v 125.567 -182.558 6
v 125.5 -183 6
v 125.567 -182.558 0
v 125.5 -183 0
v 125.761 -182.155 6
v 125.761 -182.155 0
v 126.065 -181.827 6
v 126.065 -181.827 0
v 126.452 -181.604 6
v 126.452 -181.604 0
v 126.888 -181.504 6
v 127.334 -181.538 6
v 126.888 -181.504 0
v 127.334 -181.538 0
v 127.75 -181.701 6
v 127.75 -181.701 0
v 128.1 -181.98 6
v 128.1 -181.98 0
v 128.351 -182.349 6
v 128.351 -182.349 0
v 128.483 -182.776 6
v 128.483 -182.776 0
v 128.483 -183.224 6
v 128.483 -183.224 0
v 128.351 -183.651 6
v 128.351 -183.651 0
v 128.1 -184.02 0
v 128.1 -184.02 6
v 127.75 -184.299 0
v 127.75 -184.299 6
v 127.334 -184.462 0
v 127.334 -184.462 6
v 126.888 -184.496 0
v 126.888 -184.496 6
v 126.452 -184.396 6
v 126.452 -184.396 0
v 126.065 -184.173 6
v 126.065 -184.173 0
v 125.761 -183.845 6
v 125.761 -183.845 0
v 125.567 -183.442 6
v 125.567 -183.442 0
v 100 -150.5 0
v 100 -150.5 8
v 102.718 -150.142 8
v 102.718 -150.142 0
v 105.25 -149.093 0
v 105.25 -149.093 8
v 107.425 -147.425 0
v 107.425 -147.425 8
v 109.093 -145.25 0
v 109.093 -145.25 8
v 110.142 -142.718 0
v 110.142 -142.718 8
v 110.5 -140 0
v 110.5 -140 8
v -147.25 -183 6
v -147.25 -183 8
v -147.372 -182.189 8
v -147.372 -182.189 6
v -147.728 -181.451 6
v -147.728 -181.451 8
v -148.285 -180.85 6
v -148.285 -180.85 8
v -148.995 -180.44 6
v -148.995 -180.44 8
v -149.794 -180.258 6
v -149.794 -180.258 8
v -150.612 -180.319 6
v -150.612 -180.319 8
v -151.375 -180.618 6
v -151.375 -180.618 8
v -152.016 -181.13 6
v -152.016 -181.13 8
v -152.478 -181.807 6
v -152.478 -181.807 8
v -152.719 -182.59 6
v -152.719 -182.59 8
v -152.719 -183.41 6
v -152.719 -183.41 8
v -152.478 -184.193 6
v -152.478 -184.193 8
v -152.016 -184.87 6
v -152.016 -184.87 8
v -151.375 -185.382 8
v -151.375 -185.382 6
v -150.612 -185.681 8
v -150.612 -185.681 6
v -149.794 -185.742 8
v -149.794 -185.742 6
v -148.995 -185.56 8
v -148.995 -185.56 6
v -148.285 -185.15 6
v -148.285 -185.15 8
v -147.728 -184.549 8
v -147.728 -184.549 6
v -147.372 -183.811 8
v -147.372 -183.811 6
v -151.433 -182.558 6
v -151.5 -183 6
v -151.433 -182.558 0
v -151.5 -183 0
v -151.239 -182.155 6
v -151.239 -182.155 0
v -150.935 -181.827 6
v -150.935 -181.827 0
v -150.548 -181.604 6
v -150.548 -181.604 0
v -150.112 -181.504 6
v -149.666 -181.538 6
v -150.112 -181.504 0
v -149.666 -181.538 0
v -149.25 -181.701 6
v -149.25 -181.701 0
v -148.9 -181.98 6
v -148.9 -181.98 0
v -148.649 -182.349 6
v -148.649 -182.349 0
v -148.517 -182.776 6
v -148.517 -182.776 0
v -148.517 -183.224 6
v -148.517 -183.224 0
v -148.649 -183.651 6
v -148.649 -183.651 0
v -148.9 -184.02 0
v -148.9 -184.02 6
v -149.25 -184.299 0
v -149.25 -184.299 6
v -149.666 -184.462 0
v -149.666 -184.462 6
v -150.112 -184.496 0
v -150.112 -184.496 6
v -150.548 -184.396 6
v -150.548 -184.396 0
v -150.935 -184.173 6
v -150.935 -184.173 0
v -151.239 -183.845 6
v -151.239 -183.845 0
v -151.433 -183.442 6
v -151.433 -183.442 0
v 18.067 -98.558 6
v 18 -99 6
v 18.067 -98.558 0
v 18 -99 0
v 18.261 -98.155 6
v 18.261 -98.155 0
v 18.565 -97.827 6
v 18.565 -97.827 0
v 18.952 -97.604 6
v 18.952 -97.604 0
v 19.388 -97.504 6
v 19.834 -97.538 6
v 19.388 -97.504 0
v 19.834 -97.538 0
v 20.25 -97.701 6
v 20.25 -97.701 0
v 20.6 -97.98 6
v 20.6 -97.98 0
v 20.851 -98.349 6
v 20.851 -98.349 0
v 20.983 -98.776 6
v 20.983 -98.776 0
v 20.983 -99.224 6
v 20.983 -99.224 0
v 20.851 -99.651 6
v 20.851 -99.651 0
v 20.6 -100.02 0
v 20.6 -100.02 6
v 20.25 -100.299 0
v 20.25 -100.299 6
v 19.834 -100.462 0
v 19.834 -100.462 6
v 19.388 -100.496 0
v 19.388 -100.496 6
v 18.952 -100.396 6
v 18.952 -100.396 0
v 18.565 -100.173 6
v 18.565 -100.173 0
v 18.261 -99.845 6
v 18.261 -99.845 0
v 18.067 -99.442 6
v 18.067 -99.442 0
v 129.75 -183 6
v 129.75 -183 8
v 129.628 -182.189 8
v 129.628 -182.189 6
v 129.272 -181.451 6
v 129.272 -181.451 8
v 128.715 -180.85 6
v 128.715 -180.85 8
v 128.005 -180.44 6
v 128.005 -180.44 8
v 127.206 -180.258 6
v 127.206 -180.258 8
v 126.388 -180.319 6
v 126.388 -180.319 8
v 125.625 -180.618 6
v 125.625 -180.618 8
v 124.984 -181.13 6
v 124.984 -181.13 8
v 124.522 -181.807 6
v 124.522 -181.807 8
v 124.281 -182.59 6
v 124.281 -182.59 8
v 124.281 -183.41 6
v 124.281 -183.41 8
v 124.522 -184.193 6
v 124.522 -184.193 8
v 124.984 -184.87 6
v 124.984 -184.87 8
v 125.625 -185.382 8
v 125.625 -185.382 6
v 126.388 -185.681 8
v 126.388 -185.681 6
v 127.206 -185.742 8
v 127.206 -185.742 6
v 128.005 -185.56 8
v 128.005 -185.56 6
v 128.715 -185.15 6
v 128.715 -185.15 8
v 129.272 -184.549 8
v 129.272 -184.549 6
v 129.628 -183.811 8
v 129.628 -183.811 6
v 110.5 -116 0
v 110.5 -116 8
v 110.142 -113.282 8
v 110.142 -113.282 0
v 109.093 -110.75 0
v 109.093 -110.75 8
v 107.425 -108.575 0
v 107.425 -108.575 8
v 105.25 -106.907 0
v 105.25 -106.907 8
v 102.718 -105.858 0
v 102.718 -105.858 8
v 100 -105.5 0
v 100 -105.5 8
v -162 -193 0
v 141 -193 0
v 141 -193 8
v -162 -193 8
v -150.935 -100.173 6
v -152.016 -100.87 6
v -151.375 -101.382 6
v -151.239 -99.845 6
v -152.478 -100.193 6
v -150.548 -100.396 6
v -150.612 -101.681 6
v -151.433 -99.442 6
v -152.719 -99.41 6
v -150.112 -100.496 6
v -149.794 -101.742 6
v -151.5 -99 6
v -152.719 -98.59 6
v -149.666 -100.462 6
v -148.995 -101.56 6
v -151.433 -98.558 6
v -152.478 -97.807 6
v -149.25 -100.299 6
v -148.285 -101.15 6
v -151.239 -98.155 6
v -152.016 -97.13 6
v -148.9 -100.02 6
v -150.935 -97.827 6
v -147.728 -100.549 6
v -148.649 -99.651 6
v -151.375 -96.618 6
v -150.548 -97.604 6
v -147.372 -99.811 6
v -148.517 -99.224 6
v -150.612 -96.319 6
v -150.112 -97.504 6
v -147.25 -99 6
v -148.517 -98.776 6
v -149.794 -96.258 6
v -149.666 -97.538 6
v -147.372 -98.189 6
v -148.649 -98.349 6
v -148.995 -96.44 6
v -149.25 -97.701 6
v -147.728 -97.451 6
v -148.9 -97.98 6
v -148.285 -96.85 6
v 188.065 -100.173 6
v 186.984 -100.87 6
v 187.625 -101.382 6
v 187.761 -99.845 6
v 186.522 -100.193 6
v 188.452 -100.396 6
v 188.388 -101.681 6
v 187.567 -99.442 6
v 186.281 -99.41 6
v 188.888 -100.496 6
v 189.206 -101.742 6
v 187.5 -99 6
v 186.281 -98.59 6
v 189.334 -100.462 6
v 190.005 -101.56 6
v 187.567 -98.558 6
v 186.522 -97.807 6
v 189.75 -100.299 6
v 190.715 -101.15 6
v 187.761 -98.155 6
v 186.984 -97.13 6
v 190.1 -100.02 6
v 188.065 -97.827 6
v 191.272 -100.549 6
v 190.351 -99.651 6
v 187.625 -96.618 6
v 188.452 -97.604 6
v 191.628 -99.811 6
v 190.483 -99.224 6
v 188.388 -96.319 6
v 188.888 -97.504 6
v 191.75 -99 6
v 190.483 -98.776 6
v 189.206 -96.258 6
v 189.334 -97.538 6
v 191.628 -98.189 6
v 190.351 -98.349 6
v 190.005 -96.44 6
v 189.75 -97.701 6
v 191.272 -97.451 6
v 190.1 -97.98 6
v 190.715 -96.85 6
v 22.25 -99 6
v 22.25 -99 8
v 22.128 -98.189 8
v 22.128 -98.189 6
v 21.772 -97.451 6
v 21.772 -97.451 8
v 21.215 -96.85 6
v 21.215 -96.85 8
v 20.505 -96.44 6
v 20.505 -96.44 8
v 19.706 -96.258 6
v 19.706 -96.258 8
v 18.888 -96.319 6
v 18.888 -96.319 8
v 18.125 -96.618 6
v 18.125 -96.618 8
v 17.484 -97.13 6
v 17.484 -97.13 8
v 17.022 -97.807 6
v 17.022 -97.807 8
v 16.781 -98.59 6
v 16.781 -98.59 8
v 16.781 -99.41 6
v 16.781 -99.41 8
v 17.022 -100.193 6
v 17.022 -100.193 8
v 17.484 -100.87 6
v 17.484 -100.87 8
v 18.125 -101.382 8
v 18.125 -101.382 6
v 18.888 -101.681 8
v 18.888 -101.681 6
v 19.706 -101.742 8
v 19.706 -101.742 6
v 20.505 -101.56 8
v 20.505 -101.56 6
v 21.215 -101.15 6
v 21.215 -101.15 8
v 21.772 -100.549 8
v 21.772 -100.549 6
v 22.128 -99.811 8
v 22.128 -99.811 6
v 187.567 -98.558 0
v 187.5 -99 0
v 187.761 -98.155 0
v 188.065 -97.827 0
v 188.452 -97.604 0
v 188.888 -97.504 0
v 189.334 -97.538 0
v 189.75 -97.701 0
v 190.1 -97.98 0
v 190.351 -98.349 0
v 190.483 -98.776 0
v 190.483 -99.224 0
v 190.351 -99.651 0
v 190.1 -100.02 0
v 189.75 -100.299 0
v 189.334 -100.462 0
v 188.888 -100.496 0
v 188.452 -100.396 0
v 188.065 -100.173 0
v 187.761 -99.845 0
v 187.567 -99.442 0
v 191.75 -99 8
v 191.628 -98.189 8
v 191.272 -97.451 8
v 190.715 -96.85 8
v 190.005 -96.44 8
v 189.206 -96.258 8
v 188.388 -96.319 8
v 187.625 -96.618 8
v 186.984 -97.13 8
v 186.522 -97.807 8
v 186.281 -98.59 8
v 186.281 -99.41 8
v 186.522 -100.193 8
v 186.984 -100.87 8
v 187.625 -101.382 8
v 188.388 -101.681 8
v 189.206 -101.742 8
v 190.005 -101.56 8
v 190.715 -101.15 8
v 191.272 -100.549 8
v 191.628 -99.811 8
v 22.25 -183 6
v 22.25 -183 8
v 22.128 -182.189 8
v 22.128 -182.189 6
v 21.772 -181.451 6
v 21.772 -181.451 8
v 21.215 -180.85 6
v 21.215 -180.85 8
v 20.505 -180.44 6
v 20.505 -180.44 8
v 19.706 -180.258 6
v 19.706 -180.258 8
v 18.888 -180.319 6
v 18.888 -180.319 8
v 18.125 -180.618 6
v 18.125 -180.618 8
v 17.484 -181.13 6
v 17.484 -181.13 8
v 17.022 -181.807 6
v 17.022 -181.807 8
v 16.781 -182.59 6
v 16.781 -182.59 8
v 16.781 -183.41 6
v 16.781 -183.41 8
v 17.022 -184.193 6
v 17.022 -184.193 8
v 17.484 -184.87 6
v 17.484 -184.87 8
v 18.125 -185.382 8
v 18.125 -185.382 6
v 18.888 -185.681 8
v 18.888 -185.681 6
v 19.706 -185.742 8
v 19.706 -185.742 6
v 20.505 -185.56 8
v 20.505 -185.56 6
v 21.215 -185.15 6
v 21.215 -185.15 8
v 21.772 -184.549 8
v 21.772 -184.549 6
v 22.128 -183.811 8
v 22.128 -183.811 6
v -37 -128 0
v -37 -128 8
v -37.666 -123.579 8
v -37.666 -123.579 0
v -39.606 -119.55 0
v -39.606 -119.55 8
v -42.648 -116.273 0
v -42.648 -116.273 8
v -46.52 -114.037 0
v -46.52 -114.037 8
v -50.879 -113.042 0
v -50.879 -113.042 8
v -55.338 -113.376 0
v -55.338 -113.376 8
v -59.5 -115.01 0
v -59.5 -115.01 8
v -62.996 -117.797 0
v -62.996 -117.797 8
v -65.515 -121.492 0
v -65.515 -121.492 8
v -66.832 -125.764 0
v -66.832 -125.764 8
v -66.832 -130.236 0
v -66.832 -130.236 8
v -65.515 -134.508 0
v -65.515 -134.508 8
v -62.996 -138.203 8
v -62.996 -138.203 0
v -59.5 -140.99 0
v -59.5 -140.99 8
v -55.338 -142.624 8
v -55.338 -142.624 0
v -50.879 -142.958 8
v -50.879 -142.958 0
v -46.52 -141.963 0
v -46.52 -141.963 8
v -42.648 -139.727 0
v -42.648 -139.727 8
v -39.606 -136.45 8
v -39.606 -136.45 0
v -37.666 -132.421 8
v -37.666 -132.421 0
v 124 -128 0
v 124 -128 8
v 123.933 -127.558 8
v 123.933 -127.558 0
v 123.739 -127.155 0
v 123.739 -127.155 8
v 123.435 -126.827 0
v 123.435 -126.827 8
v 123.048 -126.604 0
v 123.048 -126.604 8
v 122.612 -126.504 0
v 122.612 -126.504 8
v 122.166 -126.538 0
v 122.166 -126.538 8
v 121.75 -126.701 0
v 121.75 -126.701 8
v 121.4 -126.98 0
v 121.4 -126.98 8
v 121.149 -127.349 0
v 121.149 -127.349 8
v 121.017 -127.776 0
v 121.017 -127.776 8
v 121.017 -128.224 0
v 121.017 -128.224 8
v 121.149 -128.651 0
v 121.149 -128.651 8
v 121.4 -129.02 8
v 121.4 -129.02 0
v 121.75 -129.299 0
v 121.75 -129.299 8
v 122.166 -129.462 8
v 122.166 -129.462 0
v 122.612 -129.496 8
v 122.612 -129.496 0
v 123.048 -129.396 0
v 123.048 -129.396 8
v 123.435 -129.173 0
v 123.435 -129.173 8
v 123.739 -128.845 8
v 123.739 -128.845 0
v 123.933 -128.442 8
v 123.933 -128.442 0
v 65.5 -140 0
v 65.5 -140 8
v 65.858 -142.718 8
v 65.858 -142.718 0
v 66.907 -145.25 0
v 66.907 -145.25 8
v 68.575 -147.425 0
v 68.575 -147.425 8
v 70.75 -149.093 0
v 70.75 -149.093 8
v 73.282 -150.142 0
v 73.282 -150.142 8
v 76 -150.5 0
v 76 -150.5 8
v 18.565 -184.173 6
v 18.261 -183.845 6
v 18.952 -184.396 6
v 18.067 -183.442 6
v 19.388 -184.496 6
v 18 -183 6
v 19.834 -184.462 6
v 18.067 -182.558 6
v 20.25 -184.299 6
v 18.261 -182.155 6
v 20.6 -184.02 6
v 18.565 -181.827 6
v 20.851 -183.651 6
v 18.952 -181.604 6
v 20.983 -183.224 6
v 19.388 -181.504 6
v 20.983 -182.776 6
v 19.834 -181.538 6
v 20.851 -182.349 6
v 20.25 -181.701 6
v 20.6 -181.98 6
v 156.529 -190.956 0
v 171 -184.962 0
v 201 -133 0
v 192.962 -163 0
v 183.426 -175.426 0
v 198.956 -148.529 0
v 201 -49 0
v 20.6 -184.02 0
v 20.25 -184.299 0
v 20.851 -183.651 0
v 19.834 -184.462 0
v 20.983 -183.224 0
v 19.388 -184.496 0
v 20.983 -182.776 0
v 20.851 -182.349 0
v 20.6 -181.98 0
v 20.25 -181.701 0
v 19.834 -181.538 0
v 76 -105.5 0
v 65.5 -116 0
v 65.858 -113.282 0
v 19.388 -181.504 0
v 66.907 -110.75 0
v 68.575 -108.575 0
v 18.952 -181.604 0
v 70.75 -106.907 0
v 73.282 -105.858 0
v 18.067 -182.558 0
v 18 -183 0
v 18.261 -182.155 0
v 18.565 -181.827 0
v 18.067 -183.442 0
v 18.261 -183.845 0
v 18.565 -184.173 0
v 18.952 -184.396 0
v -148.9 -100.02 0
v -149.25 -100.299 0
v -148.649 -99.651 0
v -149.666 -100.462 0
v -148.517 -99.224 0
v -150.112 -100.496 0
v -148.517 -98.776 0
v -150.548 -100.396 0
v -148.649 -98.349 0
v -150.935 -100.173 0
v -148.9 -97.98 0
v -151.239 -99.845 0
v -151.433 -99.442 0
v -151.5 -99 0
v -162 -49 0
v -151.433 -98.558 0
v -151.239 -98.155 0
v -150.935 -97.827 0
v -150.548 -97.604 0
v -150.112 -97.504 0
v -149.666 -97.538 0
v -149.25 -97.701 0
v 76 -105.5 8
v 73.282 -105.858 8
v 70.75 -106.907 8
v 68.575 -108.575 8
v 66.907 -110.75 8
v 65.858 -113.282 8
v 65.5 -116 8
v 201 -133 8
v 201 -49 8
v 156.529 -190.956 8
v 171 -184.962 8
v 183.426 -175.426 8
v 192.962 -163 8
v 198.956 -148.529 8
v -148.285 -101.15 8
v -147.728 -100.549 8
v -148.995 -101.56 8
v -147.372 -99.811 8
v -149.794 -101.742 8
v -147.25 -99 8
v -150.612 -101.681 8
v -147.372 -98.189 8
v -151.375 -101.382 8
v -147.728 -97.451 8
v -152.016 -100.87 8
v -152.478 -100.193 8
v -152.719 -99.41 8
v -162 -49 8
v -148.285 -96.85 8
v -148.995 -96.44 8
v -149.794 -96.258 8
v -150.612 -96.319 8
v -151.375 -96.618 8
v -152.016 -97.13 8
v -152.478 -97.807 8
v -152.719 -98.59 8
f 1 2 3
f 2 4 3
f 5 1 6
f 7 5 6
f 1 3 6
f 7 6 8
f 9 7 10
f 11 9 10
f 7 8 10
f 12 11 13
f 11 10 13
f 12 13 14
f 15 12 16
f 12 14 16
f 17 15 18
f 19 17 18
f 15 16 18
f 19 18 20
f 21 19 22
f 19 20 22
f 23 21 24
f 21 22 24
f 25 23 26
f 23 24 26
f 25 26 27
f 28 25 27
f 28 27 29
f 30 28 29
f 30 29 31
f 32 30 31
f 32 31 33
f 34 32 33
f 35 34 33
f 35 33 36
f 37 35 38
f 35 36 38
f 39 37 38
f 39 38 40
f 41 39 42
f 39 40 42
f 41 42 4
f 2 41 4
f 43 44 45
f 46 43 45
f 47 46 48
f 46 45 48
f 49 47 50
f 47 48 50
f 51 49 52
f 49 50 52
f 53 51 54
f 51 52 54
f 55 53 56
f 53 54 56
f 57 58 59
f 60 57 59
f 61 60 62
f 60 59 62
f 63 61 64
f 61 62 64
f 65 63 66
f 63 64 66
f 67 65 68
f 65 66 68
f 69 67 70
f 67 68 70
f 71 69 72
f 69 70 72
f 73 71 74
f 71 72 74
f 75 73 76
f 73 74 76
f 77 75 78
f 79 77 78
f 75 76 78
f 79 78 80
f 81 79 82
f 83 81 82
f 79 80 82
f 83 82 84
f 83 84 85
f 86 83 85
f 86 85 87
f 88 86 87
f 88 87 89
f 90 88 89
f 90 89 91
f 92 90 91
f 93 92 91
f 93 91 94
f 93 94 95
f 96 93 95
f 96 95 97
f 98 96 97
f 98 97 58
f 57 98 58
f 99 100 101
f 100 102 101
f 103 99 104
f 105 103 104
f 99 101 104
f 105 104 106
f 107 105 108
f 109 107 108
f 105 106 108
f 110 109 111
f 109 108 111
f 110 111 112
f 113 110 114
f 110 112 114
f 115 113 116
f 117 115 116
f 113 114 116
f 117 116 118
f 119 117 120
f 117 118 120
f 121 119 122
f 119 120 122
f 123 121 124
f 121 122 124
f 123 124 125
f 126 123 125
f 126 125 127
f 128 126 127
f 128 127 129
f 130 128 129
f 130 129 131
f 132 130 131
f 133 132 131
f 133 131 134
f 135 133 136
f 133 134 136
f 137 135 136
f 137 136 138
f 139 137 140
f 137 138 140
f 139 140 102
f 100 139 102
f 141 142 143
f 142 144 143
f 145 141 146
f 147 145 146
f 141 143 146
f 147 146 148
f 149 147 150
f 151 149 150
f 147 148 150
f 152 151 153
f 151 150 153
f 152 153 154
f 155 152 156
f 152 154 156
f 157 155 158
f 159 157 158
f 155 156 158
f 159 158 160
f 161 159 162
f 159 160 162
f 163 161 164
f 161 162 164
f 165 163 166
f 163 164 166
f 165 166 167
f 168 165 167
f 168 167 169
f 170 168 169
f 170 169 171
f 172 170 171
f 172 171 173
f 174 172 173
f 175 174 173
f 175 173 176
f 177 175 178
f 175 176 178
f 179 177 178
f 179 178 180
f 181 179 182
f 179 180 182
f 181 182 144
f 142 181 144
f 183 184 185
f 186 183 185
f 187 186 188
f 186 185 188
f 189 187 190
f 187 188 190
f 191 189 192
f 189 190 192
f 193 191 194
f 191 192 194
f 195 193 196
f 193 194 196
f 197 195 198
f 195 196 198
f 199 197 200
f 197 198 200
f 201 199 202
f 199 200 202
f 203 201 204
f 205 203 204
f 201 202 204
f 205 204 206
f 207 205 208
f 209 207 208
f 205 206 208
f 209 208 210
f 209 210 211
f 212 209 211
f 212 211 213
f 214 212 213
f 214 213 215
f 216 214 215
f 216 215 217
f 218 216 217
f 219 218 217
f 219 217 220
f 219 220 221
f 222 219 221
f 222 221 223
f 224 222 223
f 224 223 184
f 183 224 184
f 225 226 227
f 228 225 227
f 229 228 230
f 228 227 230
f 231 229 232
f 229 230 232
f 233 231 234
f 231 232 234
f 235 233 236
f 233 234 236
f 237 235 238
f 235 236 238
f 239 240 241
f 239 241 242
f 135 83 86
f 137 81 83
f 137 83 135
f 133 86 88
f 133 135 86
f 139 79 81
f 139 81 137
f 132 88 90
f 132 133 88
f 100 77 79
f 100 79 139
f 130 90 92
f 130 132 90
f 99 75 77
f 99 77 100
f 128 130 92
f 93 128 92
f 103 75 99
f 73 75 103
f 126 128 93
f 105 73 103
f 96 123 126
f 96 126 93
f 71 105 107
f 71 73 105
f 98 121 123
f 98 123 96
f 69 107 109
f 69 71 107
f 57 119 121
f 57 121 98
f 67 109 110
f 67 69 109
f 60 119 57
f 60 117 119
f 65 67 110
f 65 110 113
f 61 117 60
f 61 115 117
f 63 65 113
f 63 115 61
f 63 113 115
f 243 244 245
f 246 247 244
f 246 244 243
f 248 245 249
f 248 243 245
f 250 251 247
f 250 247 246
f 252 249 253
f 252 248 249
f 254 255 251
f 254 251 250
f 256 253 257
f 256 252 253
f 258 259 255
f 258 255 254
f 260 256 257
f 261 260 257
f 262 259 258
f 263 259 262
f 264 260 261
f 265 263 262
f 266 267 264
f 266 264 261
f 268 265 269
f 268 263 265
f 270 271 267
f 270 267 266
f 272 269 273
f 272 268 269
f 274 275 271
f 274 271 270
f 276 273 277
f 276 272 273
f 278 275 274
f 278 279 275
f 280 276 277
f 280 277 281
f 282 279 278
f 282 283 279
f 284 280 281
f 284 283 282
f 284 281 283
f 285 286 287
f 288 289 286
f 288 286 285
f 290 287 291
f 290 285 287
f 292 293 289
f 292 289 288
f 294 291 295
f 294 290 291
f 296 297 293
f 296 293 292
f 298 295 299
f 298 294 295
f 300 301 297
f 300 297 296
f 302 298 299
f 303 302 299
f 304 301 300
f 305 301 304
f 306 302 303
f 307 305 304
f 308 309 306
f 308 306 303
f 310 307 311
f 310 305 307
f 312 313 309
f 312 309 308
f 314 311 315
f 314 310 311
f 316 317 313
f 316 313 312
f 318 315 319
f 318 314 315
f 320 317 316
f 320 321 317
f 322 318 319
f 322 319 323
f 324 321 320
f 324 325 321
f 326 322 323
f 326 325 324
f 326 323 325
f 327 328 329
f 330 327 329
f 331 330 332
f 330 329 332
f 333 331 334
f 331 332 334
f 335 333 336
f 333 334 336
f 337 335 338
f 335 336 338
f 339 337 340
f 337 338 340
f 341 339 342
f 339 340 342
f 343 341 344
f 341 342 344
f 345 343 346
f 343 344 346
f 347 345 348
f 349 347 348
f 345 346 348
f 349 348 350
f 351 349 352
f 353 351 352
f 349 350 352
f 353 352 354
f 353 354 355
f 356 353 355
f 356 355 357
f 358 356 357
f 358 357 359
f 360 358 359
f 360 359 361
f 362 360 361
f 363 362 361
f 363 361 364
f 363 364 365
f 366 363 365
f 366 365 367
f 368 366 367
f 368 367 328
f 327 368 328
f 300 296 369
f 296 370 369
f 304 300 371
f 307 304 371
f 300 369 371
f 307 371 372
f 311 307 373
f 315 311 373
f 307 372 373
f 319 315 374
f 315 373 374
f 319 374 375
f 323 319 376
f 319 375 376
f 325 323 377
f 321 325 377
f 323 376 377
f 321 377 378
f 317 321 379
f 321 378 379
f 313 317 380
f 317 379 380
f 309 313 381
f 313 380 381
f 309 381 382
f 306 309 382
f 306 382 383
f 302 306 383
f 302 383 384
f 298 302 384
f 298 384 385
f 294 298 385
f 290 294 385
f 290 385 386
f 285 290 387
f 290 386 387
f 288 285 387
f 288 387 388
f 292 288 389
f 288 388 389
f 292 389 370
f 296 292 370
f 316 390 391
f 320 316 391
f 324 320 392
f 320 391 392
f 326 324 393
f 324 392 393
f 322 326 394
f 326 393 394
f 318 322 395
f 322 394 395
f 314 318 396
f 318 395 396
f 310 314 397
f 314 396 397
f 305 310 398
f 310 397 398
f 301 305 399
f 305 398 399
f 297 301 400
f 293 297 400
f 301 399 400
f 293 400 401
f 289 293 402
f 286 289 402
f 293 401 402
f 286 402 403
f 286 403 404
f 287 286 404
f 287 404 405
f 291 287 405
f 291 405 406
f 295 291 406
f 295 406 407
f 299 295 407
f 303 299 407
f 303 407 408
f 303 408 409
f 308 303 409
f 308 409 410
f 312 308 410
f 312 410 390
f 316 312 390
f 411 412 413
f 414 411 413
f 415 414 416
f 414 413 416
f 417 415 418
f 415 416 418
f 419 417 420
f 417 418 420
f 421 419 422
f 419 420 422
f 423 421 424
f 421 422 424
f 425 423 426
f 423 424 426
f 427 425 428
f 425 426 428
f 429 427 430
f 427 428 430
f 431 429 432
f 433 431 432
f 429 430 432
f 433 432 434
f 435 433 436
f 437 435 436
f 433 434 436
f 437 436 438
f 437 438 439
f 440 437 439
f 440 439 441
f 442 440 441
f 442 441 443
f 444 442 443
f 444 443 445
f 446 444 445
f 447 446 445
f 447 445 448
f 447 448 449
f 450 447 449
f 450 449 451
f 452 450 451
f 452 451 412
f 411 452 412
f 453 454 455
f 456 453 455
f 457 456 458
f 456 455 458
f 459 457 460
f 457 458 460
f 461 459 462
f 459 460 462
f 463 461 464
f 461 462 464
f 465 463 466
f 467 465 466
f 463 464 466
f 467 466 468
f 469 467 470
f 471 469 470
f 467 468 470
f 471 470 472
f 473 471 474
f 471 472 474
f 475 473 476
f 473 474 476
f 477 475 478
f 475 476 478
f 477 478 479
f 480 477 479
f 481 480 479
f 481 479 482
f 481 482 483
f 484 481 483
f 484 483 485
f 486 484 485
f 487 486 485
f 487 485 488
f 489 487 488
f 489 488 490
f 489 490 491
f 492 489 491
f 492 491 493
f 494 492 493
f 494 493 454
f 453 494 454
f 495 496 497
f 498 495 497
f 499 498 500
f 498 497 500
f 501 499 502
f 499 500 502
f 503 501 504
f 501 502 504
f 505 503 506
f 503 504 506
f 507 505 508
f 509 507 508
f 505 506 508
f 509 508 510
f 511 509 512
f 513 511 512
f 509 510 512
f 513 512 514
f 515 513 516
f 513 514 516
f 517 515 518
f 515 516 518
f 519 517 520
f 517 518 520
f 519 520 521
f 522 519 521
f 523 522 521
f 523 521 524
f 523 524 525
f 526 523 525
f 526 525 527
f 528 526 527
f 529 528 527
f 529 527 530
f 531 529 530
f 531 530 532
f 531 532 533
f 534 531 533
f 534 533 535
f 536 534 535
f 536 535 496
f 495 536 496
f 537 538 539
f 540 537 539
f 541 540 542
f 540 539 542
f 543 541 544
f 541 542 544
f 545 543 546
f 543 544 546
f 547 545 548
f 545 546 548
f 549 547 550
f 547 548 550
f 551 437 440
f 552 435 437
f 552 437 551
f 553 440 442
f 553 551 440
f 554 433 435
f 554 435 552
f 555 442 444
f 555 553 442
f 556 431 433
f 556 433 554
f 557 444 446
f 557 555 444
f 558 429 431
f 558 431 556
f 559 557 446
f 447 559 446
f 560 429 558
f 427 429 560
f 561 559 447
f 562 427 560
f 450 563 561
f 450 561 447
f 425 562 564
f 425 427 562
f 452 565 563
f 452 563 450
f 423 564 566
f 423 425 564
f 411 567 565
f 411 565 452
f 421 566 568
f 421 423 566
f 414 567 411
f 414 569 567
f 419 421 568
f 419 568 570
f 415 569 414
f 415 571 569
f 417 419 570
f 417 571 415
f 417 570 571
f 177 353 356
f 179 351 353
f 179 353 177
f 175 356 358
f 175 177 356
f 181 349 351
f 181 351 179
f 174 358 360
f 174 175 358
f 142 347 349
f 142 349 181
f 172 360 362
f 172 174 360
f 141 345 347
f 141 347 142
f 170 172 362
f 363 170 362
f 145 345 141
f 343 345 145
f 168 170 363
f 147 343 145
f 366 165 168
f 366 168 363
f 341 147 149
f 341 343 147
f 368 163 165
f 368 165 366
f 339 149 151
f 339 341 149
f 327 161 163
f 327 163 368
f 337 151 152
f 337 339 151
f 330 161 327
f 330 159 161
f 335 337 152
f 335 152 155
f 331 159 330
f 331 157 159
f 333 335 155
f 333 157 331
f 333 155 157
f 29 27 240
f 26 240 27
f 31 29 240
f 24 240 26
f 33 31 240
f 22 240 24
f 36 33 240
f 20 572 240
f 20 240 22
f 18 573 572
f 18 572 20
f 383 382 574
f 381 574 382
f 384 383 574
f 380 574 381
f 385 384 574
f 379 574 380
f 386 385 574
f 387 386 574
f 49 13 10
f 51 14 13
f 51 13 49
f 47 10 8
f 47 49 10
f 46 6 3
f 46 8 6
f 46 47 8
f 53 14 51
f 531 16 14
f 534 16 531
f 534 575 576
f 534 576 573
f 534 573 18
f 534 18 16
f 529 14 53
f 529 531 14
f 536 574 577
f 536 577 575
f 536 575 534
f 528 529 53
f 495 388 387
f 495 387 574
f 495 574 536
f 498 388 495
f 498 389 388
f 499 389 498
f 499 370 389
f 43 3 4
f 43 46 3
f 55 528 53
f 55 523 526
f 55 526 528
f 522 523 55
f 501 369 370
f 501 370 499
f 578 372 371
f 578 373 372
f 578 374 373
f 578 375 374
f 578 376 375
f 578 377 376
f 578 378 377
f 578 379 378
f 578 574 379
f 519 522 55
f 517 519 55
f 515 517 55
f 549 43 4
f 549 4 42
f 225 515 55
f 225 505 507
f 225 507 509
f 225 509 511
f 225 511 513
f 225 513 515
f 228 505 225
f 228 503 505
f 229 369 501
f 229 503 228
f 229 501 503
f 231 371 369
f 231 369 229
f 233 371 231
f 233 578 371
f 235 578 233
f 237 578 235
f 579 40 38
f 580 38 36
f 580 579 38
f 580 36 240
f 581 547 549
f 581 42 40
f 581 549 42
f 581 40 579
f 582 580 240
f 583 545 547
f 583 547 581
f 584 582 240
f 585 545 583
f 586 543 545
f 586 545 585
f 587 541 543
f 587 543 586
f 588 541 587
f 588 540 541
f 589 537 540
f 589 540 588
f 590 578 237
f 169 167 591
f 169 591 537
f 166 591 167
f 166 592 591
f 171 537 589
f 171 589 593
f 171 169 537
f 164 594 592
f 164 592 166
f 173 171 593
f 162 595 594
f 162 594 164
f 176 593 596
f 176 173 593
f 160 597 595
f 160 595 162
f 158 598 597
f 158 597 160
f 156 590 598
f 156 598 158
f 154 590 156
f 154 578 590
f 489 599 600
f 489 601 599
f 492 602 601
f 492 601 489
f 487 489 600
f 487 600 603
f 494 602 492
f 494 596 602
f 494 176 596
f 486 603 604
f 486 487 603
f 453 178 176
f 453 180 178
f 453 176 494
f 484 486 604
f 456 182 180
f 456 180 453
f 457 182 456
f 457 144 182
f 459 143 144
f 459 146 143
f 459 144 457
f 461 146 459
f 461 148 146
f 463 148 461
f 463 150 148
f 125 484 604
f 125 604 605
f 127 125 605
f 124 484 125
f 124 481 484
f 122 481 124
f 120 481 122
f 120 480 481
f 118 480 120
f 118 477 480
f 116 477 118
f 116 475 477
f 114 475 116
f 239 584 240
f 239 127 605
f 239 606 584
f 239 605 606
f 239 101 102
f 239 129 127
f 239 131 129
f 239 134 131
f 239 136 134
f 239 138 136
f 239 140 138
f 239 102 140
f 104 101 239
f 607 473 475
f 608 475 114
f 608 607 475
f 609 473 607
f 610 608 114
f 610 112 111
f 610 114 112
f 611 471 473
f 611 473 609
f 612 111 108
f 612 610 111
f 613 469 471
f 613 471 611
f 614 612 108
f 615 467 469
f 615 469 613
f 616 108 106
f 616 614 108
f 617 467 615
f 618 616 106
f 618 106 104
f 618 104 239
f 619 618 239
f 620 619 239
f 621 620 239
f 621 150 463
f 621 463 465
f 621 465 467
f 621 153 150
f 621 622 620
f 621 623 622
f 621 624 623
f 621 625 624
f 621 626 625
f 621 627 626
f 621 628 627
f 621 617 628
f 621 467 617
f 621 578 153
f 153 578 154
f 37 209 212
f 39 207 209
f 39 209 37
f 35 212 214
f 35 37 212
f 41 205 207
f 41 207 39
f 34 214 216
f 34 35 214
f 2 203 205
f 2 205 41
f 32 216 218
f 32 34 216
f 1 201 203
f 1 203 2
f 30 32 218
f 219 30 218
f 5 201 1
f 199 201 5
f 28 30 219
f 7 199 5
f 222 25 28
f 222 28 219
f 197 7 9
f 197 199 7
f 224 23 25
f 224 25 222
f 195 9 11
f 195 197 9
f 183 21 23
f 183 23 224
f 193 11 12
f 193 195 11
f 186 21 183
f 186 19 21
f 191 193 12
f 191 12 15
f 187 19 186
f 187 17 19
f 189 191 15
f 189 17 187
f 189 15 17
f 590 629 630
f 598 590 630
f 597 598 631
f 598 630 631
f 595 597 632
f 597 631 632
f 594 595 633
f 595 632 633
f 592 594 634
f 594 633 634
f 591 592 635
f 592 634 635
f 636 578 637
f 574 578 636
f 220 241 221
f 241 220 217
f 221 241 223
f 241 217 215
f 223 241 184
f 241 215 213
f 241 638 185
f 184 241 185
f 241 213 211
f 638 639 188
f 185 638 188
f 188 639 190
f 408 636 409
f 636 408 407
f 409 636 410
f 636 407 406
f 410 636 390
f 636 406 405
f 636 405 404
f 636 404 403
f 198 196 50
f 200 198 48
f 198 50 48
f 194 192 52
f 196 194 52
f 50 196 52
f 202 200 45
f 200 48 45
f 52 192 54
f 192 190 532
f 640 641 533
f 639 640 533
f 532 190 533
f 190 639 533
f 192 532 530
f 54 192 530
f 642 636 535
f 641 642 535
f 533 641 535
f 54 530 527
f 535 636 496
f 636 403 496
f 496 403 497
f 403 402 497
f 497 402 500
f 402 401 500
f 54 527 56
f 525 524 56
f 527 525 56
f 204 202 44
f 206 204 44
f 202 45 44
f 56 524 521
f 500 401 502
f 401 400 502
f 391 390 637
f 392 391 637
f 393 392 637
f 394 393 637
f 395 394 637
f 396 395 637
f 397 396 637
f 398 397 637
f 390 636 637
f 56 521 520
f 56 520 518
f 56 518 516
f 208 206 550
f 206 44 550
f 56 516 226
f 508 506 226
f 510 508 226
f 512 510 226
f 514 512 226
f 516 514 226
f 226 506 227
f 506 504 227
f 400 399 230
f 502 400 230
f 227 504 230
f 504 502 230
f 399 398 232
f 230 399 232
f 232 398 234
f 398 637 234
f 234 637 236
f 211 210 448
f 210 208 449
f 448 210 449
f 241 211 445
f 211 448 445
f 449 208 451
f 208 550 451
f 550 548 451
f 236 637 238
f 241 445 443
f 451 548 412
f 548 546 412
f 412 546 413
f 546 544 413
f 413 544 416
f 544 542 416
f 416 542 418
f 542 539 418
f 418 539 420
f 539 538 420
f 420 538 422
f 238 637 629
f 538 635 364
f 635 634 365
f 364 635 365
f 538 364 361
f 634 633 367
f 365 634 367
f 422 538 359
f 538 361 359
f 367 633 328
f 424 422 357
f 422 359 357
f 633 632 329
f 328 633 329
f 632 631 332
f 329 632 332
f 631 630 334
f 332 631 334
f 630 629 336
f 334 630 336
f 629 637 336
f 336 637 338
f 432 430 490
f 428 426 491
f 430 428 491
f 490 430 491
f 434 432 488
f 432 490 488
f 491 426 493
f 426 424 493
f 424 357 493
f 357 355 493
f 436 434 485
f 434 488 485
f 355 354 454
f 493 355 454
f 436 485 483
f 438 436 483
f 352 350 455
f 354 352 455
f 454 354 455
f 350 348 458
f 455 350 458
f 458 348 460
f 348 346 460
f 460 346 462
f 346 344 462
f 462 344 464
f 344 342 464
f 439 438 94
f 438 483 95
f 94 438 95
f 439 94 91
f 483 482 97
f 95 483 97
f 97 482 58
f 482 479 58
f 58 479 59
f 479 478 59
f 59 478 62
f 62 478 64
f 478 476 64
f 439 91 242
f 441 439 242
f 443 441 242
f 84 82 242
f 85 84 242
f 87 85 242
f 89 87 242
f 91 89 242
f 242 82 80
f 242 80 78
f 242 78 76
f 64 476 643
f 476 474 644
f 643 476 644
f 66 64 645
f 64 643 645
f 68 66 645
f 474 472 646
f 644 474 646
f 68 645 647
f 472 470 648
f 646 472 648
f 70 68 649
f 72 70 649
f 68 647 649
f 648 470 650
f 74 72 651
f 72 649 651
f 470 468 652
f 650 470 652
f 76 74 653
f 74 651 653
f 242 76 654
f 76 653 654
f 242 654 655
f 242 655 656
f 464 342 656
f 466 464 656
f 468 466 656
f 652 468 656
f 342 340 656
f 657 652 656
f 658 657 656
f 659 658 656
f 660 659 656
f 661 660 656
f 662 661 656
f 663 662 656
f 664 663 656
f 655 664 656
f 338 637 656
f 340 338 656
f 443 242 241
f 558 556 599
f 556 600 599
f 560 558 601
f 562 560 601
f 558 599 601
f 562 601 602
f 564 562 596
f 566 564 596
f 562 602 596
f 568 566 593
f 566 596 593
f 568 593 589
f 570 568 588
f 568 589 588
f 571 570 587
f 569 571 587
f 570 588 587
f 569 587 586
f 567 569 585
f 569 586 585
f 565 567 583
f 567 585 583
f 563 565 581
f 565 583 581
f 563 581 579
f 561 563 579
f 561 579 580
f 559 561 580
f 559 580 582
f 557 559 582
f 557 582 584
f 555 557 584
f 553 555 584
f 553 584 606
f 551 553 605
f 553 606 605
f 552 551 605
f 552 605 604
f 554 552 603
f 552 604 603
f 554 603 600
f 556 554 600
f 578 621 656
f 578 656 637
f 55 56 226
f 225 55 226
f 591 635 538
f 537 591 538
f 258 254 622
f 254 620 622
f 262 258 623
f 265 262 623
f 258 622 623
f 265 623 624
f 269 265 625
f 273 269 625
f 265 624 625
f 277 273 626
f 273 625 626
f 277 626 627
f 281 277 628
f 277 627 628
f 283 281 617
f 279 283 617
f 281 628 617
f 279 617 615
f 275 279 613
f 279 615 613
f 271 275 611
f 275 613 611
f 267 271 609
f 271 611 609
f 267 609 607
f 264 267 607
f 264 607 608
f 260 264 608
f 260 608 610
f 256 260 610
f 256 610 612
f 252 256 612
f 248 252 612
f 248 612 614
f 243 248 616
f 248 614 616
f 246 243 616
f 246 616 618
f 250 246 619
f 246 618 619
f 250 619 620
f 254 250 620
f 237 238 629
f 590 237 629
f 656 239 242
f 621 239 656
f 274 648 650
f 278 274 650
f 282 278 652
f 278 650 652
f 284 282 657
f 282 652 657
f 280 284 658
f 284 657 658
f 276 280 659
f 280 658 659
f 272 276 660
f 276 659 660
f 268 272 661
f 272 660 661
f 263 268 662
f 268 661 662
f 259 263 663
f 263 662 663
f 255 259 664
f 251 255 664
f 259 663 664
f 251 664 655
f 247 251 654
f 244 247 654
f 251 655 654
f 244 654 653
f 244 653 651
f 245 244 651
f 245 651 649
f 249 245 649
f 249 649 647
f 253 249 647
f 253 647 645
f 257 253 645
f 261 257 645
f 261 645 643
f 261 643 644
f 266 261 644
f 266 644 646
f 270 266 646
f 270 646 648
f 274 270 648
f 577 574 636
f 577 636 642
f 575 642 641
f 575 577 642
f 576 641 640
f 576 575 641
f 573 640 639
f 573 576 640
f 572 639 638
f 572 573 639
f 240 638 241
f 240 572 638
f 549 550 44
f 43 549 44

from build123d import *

# Parameters (mm, degrees)
BOSS_EXTRU_1_DEPTH                                 = 8
ESQUISSE2_R                                        = 15
ESQUISSE2_R_2                                      = 1.5
ENL_V_MAT_EXTRU_1_DEPTH                            = 9
CHAMBRAGE_POUR_VIS_T_TE_CYLINDRIQUE_CO_D           = 3
CHAMBRAGE_POUR_VIS_T_TE_CYLINDRIQUE_CO_CBORE_D     = 5.5
CHAMBRAGE_POUR_VIS_T_TE_CYLINDRIQUE_CO_CBORE_DEPTH = 2


with BuildPart() as part:
    # Esquisse1 → Boss.-Extru.1 (new body)
    with BuildSketch(Plane.XY):
        with BuildLine():
            Line((-162, -49), (201, -49))
            Line((201, -49), (201, -133))
            ThreePointArc((201, -133), (183.426406871, -175.426406871), (141, -193))
            Line((141, -193), (-162, -193))
            Line((-162, -193), (-162, -49))
        make_face()
    extrude(amount=BOSS_EXTRU_1_DEPTH)

    # Esquisse2 → Enlèv. mat.-Extru.1 (cut, through all)
    with BuildSketch(Plane.XY.offset(8)):
        with Locations((-52, -128)):
            Circle(ESQUISSE2_R)
        with Locations((122.5, -128)):
            Circle(ESQUISSE2_R_2)
        with BuildLine():
            Line((76, -150.5), (100, -150.5))
            ThreePointArc((100, -150.5), (107.424621202, -147.424621202), (110.5, -140))
            Line((110.5, -140), (110.5, -116))
            ThreePointArc((110.5, -116), (107.424621202, -108.575378798), (100, -105.5))
            Line((100, -105.5), (76, -105.5))
            ThreePointArc((76, -105.5), (68.575378798, -108.575378798), (65.5, -116))
            Line((65.5, -116), (65.5, -140))
            ThreePointArc((65.5, -140), (68.575378798, -147.424621202), (76, -150.5))
        make_face()
    extrude(amount=-ENL_V_MAT_EXTRU_1_DEPTH, mode=Mode.SUBTRACT)

    # Chambrage pour vis à tête cylindrique courte six pans creux M31 (through all)
    with Locations(Plane.XY.offset(8)):
        with Locations((-150, -99), (19.5, -99), (189, -99), (-150, -183), (19.5, -183), (127, -183)):
            CounterBoreHole(CHAMBRAGE_POUR_VIS_T_TE_CYLINDRIQUE_CO_D / 2, CHAMBRAGE_POUR_VIS_T_TE_CYLINDRIQUE_CO_CBORE_D / 2, CHAMBRAGE_POUR_VIS_T_TE_CYLINDRIQUE_CO_CBORE_DEPTH)


solid = part.part
